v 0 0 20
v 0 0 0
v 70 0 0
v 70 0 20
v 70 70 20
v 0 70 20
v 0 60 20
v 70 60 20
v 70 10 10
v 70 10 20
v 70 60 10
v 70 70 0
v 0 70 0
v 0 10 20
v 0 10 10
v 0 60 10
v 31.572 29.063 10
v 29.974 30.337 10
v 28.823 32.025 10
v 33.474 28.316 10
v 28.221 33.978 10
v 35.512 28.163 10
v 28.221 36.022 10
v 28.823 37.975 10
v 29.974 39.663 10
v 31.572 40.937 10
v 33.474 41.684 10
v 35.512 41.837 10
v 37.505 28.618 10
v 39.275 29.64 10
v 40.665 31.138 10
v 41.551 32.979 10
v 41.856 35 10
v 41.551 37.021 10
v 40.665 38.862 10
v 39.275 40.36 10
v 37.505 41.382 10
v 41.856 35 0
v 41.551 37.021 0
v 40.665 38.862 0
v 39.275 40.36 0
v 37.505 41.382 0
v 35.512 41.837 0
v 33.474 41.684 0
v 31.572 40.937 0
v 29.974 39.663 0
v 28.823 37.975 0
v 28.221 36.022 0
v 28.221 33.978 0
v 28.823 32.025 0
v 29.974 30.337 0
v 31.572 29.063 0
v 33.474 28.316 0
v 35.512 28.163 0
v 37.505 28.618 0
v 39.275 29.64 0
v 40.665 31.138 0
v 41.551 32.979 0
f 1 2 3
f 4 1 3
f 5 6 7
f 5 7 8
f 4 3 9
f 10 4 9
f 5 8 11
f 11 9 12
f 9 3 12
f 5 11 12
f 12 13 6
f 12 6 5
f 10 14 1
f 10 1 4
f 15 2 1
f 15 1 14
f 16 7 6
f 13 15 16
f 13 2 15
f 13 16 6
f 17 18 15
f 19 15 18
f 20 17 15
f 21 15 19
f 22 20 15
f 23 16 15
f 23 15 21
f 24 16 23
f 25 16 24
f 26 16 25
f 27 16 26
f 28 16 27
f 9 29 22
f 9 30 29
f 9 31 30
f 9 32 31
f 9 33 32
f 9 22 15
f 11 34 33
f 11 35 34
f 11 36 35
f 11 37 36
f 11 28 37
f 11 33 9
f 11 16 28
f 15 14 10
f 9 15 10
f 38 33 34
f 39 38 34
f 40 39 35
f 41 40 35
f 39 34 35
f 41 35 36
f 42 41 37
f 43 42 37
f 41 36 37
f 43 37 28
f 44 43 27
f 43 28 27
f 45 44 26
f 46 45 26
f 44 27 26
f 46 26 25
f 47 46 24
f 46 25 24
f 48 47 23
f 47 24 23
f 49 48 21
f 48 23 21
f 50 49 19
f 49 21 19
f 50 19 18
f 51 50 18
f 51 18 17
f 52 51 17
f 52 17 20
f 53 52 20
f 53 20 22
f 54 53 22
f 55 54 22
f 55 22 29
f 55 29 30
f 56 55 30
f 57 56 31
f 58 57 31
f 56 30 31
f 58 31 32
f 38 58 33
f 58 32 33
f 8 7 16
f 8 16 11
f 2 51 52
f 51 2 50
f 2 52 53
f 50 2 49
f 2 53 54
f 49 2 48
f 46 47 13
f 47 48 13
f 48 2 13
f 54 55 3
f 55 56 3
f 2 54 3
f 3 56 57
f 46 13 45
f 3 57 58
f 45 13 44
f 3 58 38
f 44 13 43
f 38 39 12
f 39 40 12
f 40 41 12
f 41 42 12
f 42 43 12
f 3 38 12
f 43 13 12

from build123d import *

# Parameters (mm, degrees)
SKETCH1_W           = 70
SKETCH1_H           = 70
BOSS_EXTRUDE1_DEPTH = 20
SKETCH2_W           = 70
SKETCH2_H           = 50
CUT_EXTRUDE1_DEPTH  = 10
SKETCH3_R           = 6.85602035
CUT_EXTRUDE2_DEPTH  = 10


with BuildPart() as part:
    # Sketch1 → Boss-Extrude1 (new body)
    with BuildSketch(Plane.XY):
        with Locations((35, 35)):
            Rectangle(SKETCH1_W, SKETCH1_H)
    extrude(amount=BOSS_EXTRUDE1_DEPTH)

    # Sketch2 → Cut-Extrude1 (cut)
    with BuildSketch(Plane.XY.offset(20)):
        with Locations((35, 35)):
            Rectangle(SKETCH2_W, SKETCH2_H)
    extrude(amount=-CUT_EXTRUDE1_DEPTH, mode=Mode.SUBTRACT)

    # Sketch3 → Cut-Extrude2 (cut)
    with BuildSketch(Plane.XY.offset(10)):
        with Locations((35, 35)):
            Circle(SKETCH3_R)
    extrude(amount=-CUT_EXTRUDE2_DEPTH, mode=Mode.SUBTRACT)


solid = part.part
